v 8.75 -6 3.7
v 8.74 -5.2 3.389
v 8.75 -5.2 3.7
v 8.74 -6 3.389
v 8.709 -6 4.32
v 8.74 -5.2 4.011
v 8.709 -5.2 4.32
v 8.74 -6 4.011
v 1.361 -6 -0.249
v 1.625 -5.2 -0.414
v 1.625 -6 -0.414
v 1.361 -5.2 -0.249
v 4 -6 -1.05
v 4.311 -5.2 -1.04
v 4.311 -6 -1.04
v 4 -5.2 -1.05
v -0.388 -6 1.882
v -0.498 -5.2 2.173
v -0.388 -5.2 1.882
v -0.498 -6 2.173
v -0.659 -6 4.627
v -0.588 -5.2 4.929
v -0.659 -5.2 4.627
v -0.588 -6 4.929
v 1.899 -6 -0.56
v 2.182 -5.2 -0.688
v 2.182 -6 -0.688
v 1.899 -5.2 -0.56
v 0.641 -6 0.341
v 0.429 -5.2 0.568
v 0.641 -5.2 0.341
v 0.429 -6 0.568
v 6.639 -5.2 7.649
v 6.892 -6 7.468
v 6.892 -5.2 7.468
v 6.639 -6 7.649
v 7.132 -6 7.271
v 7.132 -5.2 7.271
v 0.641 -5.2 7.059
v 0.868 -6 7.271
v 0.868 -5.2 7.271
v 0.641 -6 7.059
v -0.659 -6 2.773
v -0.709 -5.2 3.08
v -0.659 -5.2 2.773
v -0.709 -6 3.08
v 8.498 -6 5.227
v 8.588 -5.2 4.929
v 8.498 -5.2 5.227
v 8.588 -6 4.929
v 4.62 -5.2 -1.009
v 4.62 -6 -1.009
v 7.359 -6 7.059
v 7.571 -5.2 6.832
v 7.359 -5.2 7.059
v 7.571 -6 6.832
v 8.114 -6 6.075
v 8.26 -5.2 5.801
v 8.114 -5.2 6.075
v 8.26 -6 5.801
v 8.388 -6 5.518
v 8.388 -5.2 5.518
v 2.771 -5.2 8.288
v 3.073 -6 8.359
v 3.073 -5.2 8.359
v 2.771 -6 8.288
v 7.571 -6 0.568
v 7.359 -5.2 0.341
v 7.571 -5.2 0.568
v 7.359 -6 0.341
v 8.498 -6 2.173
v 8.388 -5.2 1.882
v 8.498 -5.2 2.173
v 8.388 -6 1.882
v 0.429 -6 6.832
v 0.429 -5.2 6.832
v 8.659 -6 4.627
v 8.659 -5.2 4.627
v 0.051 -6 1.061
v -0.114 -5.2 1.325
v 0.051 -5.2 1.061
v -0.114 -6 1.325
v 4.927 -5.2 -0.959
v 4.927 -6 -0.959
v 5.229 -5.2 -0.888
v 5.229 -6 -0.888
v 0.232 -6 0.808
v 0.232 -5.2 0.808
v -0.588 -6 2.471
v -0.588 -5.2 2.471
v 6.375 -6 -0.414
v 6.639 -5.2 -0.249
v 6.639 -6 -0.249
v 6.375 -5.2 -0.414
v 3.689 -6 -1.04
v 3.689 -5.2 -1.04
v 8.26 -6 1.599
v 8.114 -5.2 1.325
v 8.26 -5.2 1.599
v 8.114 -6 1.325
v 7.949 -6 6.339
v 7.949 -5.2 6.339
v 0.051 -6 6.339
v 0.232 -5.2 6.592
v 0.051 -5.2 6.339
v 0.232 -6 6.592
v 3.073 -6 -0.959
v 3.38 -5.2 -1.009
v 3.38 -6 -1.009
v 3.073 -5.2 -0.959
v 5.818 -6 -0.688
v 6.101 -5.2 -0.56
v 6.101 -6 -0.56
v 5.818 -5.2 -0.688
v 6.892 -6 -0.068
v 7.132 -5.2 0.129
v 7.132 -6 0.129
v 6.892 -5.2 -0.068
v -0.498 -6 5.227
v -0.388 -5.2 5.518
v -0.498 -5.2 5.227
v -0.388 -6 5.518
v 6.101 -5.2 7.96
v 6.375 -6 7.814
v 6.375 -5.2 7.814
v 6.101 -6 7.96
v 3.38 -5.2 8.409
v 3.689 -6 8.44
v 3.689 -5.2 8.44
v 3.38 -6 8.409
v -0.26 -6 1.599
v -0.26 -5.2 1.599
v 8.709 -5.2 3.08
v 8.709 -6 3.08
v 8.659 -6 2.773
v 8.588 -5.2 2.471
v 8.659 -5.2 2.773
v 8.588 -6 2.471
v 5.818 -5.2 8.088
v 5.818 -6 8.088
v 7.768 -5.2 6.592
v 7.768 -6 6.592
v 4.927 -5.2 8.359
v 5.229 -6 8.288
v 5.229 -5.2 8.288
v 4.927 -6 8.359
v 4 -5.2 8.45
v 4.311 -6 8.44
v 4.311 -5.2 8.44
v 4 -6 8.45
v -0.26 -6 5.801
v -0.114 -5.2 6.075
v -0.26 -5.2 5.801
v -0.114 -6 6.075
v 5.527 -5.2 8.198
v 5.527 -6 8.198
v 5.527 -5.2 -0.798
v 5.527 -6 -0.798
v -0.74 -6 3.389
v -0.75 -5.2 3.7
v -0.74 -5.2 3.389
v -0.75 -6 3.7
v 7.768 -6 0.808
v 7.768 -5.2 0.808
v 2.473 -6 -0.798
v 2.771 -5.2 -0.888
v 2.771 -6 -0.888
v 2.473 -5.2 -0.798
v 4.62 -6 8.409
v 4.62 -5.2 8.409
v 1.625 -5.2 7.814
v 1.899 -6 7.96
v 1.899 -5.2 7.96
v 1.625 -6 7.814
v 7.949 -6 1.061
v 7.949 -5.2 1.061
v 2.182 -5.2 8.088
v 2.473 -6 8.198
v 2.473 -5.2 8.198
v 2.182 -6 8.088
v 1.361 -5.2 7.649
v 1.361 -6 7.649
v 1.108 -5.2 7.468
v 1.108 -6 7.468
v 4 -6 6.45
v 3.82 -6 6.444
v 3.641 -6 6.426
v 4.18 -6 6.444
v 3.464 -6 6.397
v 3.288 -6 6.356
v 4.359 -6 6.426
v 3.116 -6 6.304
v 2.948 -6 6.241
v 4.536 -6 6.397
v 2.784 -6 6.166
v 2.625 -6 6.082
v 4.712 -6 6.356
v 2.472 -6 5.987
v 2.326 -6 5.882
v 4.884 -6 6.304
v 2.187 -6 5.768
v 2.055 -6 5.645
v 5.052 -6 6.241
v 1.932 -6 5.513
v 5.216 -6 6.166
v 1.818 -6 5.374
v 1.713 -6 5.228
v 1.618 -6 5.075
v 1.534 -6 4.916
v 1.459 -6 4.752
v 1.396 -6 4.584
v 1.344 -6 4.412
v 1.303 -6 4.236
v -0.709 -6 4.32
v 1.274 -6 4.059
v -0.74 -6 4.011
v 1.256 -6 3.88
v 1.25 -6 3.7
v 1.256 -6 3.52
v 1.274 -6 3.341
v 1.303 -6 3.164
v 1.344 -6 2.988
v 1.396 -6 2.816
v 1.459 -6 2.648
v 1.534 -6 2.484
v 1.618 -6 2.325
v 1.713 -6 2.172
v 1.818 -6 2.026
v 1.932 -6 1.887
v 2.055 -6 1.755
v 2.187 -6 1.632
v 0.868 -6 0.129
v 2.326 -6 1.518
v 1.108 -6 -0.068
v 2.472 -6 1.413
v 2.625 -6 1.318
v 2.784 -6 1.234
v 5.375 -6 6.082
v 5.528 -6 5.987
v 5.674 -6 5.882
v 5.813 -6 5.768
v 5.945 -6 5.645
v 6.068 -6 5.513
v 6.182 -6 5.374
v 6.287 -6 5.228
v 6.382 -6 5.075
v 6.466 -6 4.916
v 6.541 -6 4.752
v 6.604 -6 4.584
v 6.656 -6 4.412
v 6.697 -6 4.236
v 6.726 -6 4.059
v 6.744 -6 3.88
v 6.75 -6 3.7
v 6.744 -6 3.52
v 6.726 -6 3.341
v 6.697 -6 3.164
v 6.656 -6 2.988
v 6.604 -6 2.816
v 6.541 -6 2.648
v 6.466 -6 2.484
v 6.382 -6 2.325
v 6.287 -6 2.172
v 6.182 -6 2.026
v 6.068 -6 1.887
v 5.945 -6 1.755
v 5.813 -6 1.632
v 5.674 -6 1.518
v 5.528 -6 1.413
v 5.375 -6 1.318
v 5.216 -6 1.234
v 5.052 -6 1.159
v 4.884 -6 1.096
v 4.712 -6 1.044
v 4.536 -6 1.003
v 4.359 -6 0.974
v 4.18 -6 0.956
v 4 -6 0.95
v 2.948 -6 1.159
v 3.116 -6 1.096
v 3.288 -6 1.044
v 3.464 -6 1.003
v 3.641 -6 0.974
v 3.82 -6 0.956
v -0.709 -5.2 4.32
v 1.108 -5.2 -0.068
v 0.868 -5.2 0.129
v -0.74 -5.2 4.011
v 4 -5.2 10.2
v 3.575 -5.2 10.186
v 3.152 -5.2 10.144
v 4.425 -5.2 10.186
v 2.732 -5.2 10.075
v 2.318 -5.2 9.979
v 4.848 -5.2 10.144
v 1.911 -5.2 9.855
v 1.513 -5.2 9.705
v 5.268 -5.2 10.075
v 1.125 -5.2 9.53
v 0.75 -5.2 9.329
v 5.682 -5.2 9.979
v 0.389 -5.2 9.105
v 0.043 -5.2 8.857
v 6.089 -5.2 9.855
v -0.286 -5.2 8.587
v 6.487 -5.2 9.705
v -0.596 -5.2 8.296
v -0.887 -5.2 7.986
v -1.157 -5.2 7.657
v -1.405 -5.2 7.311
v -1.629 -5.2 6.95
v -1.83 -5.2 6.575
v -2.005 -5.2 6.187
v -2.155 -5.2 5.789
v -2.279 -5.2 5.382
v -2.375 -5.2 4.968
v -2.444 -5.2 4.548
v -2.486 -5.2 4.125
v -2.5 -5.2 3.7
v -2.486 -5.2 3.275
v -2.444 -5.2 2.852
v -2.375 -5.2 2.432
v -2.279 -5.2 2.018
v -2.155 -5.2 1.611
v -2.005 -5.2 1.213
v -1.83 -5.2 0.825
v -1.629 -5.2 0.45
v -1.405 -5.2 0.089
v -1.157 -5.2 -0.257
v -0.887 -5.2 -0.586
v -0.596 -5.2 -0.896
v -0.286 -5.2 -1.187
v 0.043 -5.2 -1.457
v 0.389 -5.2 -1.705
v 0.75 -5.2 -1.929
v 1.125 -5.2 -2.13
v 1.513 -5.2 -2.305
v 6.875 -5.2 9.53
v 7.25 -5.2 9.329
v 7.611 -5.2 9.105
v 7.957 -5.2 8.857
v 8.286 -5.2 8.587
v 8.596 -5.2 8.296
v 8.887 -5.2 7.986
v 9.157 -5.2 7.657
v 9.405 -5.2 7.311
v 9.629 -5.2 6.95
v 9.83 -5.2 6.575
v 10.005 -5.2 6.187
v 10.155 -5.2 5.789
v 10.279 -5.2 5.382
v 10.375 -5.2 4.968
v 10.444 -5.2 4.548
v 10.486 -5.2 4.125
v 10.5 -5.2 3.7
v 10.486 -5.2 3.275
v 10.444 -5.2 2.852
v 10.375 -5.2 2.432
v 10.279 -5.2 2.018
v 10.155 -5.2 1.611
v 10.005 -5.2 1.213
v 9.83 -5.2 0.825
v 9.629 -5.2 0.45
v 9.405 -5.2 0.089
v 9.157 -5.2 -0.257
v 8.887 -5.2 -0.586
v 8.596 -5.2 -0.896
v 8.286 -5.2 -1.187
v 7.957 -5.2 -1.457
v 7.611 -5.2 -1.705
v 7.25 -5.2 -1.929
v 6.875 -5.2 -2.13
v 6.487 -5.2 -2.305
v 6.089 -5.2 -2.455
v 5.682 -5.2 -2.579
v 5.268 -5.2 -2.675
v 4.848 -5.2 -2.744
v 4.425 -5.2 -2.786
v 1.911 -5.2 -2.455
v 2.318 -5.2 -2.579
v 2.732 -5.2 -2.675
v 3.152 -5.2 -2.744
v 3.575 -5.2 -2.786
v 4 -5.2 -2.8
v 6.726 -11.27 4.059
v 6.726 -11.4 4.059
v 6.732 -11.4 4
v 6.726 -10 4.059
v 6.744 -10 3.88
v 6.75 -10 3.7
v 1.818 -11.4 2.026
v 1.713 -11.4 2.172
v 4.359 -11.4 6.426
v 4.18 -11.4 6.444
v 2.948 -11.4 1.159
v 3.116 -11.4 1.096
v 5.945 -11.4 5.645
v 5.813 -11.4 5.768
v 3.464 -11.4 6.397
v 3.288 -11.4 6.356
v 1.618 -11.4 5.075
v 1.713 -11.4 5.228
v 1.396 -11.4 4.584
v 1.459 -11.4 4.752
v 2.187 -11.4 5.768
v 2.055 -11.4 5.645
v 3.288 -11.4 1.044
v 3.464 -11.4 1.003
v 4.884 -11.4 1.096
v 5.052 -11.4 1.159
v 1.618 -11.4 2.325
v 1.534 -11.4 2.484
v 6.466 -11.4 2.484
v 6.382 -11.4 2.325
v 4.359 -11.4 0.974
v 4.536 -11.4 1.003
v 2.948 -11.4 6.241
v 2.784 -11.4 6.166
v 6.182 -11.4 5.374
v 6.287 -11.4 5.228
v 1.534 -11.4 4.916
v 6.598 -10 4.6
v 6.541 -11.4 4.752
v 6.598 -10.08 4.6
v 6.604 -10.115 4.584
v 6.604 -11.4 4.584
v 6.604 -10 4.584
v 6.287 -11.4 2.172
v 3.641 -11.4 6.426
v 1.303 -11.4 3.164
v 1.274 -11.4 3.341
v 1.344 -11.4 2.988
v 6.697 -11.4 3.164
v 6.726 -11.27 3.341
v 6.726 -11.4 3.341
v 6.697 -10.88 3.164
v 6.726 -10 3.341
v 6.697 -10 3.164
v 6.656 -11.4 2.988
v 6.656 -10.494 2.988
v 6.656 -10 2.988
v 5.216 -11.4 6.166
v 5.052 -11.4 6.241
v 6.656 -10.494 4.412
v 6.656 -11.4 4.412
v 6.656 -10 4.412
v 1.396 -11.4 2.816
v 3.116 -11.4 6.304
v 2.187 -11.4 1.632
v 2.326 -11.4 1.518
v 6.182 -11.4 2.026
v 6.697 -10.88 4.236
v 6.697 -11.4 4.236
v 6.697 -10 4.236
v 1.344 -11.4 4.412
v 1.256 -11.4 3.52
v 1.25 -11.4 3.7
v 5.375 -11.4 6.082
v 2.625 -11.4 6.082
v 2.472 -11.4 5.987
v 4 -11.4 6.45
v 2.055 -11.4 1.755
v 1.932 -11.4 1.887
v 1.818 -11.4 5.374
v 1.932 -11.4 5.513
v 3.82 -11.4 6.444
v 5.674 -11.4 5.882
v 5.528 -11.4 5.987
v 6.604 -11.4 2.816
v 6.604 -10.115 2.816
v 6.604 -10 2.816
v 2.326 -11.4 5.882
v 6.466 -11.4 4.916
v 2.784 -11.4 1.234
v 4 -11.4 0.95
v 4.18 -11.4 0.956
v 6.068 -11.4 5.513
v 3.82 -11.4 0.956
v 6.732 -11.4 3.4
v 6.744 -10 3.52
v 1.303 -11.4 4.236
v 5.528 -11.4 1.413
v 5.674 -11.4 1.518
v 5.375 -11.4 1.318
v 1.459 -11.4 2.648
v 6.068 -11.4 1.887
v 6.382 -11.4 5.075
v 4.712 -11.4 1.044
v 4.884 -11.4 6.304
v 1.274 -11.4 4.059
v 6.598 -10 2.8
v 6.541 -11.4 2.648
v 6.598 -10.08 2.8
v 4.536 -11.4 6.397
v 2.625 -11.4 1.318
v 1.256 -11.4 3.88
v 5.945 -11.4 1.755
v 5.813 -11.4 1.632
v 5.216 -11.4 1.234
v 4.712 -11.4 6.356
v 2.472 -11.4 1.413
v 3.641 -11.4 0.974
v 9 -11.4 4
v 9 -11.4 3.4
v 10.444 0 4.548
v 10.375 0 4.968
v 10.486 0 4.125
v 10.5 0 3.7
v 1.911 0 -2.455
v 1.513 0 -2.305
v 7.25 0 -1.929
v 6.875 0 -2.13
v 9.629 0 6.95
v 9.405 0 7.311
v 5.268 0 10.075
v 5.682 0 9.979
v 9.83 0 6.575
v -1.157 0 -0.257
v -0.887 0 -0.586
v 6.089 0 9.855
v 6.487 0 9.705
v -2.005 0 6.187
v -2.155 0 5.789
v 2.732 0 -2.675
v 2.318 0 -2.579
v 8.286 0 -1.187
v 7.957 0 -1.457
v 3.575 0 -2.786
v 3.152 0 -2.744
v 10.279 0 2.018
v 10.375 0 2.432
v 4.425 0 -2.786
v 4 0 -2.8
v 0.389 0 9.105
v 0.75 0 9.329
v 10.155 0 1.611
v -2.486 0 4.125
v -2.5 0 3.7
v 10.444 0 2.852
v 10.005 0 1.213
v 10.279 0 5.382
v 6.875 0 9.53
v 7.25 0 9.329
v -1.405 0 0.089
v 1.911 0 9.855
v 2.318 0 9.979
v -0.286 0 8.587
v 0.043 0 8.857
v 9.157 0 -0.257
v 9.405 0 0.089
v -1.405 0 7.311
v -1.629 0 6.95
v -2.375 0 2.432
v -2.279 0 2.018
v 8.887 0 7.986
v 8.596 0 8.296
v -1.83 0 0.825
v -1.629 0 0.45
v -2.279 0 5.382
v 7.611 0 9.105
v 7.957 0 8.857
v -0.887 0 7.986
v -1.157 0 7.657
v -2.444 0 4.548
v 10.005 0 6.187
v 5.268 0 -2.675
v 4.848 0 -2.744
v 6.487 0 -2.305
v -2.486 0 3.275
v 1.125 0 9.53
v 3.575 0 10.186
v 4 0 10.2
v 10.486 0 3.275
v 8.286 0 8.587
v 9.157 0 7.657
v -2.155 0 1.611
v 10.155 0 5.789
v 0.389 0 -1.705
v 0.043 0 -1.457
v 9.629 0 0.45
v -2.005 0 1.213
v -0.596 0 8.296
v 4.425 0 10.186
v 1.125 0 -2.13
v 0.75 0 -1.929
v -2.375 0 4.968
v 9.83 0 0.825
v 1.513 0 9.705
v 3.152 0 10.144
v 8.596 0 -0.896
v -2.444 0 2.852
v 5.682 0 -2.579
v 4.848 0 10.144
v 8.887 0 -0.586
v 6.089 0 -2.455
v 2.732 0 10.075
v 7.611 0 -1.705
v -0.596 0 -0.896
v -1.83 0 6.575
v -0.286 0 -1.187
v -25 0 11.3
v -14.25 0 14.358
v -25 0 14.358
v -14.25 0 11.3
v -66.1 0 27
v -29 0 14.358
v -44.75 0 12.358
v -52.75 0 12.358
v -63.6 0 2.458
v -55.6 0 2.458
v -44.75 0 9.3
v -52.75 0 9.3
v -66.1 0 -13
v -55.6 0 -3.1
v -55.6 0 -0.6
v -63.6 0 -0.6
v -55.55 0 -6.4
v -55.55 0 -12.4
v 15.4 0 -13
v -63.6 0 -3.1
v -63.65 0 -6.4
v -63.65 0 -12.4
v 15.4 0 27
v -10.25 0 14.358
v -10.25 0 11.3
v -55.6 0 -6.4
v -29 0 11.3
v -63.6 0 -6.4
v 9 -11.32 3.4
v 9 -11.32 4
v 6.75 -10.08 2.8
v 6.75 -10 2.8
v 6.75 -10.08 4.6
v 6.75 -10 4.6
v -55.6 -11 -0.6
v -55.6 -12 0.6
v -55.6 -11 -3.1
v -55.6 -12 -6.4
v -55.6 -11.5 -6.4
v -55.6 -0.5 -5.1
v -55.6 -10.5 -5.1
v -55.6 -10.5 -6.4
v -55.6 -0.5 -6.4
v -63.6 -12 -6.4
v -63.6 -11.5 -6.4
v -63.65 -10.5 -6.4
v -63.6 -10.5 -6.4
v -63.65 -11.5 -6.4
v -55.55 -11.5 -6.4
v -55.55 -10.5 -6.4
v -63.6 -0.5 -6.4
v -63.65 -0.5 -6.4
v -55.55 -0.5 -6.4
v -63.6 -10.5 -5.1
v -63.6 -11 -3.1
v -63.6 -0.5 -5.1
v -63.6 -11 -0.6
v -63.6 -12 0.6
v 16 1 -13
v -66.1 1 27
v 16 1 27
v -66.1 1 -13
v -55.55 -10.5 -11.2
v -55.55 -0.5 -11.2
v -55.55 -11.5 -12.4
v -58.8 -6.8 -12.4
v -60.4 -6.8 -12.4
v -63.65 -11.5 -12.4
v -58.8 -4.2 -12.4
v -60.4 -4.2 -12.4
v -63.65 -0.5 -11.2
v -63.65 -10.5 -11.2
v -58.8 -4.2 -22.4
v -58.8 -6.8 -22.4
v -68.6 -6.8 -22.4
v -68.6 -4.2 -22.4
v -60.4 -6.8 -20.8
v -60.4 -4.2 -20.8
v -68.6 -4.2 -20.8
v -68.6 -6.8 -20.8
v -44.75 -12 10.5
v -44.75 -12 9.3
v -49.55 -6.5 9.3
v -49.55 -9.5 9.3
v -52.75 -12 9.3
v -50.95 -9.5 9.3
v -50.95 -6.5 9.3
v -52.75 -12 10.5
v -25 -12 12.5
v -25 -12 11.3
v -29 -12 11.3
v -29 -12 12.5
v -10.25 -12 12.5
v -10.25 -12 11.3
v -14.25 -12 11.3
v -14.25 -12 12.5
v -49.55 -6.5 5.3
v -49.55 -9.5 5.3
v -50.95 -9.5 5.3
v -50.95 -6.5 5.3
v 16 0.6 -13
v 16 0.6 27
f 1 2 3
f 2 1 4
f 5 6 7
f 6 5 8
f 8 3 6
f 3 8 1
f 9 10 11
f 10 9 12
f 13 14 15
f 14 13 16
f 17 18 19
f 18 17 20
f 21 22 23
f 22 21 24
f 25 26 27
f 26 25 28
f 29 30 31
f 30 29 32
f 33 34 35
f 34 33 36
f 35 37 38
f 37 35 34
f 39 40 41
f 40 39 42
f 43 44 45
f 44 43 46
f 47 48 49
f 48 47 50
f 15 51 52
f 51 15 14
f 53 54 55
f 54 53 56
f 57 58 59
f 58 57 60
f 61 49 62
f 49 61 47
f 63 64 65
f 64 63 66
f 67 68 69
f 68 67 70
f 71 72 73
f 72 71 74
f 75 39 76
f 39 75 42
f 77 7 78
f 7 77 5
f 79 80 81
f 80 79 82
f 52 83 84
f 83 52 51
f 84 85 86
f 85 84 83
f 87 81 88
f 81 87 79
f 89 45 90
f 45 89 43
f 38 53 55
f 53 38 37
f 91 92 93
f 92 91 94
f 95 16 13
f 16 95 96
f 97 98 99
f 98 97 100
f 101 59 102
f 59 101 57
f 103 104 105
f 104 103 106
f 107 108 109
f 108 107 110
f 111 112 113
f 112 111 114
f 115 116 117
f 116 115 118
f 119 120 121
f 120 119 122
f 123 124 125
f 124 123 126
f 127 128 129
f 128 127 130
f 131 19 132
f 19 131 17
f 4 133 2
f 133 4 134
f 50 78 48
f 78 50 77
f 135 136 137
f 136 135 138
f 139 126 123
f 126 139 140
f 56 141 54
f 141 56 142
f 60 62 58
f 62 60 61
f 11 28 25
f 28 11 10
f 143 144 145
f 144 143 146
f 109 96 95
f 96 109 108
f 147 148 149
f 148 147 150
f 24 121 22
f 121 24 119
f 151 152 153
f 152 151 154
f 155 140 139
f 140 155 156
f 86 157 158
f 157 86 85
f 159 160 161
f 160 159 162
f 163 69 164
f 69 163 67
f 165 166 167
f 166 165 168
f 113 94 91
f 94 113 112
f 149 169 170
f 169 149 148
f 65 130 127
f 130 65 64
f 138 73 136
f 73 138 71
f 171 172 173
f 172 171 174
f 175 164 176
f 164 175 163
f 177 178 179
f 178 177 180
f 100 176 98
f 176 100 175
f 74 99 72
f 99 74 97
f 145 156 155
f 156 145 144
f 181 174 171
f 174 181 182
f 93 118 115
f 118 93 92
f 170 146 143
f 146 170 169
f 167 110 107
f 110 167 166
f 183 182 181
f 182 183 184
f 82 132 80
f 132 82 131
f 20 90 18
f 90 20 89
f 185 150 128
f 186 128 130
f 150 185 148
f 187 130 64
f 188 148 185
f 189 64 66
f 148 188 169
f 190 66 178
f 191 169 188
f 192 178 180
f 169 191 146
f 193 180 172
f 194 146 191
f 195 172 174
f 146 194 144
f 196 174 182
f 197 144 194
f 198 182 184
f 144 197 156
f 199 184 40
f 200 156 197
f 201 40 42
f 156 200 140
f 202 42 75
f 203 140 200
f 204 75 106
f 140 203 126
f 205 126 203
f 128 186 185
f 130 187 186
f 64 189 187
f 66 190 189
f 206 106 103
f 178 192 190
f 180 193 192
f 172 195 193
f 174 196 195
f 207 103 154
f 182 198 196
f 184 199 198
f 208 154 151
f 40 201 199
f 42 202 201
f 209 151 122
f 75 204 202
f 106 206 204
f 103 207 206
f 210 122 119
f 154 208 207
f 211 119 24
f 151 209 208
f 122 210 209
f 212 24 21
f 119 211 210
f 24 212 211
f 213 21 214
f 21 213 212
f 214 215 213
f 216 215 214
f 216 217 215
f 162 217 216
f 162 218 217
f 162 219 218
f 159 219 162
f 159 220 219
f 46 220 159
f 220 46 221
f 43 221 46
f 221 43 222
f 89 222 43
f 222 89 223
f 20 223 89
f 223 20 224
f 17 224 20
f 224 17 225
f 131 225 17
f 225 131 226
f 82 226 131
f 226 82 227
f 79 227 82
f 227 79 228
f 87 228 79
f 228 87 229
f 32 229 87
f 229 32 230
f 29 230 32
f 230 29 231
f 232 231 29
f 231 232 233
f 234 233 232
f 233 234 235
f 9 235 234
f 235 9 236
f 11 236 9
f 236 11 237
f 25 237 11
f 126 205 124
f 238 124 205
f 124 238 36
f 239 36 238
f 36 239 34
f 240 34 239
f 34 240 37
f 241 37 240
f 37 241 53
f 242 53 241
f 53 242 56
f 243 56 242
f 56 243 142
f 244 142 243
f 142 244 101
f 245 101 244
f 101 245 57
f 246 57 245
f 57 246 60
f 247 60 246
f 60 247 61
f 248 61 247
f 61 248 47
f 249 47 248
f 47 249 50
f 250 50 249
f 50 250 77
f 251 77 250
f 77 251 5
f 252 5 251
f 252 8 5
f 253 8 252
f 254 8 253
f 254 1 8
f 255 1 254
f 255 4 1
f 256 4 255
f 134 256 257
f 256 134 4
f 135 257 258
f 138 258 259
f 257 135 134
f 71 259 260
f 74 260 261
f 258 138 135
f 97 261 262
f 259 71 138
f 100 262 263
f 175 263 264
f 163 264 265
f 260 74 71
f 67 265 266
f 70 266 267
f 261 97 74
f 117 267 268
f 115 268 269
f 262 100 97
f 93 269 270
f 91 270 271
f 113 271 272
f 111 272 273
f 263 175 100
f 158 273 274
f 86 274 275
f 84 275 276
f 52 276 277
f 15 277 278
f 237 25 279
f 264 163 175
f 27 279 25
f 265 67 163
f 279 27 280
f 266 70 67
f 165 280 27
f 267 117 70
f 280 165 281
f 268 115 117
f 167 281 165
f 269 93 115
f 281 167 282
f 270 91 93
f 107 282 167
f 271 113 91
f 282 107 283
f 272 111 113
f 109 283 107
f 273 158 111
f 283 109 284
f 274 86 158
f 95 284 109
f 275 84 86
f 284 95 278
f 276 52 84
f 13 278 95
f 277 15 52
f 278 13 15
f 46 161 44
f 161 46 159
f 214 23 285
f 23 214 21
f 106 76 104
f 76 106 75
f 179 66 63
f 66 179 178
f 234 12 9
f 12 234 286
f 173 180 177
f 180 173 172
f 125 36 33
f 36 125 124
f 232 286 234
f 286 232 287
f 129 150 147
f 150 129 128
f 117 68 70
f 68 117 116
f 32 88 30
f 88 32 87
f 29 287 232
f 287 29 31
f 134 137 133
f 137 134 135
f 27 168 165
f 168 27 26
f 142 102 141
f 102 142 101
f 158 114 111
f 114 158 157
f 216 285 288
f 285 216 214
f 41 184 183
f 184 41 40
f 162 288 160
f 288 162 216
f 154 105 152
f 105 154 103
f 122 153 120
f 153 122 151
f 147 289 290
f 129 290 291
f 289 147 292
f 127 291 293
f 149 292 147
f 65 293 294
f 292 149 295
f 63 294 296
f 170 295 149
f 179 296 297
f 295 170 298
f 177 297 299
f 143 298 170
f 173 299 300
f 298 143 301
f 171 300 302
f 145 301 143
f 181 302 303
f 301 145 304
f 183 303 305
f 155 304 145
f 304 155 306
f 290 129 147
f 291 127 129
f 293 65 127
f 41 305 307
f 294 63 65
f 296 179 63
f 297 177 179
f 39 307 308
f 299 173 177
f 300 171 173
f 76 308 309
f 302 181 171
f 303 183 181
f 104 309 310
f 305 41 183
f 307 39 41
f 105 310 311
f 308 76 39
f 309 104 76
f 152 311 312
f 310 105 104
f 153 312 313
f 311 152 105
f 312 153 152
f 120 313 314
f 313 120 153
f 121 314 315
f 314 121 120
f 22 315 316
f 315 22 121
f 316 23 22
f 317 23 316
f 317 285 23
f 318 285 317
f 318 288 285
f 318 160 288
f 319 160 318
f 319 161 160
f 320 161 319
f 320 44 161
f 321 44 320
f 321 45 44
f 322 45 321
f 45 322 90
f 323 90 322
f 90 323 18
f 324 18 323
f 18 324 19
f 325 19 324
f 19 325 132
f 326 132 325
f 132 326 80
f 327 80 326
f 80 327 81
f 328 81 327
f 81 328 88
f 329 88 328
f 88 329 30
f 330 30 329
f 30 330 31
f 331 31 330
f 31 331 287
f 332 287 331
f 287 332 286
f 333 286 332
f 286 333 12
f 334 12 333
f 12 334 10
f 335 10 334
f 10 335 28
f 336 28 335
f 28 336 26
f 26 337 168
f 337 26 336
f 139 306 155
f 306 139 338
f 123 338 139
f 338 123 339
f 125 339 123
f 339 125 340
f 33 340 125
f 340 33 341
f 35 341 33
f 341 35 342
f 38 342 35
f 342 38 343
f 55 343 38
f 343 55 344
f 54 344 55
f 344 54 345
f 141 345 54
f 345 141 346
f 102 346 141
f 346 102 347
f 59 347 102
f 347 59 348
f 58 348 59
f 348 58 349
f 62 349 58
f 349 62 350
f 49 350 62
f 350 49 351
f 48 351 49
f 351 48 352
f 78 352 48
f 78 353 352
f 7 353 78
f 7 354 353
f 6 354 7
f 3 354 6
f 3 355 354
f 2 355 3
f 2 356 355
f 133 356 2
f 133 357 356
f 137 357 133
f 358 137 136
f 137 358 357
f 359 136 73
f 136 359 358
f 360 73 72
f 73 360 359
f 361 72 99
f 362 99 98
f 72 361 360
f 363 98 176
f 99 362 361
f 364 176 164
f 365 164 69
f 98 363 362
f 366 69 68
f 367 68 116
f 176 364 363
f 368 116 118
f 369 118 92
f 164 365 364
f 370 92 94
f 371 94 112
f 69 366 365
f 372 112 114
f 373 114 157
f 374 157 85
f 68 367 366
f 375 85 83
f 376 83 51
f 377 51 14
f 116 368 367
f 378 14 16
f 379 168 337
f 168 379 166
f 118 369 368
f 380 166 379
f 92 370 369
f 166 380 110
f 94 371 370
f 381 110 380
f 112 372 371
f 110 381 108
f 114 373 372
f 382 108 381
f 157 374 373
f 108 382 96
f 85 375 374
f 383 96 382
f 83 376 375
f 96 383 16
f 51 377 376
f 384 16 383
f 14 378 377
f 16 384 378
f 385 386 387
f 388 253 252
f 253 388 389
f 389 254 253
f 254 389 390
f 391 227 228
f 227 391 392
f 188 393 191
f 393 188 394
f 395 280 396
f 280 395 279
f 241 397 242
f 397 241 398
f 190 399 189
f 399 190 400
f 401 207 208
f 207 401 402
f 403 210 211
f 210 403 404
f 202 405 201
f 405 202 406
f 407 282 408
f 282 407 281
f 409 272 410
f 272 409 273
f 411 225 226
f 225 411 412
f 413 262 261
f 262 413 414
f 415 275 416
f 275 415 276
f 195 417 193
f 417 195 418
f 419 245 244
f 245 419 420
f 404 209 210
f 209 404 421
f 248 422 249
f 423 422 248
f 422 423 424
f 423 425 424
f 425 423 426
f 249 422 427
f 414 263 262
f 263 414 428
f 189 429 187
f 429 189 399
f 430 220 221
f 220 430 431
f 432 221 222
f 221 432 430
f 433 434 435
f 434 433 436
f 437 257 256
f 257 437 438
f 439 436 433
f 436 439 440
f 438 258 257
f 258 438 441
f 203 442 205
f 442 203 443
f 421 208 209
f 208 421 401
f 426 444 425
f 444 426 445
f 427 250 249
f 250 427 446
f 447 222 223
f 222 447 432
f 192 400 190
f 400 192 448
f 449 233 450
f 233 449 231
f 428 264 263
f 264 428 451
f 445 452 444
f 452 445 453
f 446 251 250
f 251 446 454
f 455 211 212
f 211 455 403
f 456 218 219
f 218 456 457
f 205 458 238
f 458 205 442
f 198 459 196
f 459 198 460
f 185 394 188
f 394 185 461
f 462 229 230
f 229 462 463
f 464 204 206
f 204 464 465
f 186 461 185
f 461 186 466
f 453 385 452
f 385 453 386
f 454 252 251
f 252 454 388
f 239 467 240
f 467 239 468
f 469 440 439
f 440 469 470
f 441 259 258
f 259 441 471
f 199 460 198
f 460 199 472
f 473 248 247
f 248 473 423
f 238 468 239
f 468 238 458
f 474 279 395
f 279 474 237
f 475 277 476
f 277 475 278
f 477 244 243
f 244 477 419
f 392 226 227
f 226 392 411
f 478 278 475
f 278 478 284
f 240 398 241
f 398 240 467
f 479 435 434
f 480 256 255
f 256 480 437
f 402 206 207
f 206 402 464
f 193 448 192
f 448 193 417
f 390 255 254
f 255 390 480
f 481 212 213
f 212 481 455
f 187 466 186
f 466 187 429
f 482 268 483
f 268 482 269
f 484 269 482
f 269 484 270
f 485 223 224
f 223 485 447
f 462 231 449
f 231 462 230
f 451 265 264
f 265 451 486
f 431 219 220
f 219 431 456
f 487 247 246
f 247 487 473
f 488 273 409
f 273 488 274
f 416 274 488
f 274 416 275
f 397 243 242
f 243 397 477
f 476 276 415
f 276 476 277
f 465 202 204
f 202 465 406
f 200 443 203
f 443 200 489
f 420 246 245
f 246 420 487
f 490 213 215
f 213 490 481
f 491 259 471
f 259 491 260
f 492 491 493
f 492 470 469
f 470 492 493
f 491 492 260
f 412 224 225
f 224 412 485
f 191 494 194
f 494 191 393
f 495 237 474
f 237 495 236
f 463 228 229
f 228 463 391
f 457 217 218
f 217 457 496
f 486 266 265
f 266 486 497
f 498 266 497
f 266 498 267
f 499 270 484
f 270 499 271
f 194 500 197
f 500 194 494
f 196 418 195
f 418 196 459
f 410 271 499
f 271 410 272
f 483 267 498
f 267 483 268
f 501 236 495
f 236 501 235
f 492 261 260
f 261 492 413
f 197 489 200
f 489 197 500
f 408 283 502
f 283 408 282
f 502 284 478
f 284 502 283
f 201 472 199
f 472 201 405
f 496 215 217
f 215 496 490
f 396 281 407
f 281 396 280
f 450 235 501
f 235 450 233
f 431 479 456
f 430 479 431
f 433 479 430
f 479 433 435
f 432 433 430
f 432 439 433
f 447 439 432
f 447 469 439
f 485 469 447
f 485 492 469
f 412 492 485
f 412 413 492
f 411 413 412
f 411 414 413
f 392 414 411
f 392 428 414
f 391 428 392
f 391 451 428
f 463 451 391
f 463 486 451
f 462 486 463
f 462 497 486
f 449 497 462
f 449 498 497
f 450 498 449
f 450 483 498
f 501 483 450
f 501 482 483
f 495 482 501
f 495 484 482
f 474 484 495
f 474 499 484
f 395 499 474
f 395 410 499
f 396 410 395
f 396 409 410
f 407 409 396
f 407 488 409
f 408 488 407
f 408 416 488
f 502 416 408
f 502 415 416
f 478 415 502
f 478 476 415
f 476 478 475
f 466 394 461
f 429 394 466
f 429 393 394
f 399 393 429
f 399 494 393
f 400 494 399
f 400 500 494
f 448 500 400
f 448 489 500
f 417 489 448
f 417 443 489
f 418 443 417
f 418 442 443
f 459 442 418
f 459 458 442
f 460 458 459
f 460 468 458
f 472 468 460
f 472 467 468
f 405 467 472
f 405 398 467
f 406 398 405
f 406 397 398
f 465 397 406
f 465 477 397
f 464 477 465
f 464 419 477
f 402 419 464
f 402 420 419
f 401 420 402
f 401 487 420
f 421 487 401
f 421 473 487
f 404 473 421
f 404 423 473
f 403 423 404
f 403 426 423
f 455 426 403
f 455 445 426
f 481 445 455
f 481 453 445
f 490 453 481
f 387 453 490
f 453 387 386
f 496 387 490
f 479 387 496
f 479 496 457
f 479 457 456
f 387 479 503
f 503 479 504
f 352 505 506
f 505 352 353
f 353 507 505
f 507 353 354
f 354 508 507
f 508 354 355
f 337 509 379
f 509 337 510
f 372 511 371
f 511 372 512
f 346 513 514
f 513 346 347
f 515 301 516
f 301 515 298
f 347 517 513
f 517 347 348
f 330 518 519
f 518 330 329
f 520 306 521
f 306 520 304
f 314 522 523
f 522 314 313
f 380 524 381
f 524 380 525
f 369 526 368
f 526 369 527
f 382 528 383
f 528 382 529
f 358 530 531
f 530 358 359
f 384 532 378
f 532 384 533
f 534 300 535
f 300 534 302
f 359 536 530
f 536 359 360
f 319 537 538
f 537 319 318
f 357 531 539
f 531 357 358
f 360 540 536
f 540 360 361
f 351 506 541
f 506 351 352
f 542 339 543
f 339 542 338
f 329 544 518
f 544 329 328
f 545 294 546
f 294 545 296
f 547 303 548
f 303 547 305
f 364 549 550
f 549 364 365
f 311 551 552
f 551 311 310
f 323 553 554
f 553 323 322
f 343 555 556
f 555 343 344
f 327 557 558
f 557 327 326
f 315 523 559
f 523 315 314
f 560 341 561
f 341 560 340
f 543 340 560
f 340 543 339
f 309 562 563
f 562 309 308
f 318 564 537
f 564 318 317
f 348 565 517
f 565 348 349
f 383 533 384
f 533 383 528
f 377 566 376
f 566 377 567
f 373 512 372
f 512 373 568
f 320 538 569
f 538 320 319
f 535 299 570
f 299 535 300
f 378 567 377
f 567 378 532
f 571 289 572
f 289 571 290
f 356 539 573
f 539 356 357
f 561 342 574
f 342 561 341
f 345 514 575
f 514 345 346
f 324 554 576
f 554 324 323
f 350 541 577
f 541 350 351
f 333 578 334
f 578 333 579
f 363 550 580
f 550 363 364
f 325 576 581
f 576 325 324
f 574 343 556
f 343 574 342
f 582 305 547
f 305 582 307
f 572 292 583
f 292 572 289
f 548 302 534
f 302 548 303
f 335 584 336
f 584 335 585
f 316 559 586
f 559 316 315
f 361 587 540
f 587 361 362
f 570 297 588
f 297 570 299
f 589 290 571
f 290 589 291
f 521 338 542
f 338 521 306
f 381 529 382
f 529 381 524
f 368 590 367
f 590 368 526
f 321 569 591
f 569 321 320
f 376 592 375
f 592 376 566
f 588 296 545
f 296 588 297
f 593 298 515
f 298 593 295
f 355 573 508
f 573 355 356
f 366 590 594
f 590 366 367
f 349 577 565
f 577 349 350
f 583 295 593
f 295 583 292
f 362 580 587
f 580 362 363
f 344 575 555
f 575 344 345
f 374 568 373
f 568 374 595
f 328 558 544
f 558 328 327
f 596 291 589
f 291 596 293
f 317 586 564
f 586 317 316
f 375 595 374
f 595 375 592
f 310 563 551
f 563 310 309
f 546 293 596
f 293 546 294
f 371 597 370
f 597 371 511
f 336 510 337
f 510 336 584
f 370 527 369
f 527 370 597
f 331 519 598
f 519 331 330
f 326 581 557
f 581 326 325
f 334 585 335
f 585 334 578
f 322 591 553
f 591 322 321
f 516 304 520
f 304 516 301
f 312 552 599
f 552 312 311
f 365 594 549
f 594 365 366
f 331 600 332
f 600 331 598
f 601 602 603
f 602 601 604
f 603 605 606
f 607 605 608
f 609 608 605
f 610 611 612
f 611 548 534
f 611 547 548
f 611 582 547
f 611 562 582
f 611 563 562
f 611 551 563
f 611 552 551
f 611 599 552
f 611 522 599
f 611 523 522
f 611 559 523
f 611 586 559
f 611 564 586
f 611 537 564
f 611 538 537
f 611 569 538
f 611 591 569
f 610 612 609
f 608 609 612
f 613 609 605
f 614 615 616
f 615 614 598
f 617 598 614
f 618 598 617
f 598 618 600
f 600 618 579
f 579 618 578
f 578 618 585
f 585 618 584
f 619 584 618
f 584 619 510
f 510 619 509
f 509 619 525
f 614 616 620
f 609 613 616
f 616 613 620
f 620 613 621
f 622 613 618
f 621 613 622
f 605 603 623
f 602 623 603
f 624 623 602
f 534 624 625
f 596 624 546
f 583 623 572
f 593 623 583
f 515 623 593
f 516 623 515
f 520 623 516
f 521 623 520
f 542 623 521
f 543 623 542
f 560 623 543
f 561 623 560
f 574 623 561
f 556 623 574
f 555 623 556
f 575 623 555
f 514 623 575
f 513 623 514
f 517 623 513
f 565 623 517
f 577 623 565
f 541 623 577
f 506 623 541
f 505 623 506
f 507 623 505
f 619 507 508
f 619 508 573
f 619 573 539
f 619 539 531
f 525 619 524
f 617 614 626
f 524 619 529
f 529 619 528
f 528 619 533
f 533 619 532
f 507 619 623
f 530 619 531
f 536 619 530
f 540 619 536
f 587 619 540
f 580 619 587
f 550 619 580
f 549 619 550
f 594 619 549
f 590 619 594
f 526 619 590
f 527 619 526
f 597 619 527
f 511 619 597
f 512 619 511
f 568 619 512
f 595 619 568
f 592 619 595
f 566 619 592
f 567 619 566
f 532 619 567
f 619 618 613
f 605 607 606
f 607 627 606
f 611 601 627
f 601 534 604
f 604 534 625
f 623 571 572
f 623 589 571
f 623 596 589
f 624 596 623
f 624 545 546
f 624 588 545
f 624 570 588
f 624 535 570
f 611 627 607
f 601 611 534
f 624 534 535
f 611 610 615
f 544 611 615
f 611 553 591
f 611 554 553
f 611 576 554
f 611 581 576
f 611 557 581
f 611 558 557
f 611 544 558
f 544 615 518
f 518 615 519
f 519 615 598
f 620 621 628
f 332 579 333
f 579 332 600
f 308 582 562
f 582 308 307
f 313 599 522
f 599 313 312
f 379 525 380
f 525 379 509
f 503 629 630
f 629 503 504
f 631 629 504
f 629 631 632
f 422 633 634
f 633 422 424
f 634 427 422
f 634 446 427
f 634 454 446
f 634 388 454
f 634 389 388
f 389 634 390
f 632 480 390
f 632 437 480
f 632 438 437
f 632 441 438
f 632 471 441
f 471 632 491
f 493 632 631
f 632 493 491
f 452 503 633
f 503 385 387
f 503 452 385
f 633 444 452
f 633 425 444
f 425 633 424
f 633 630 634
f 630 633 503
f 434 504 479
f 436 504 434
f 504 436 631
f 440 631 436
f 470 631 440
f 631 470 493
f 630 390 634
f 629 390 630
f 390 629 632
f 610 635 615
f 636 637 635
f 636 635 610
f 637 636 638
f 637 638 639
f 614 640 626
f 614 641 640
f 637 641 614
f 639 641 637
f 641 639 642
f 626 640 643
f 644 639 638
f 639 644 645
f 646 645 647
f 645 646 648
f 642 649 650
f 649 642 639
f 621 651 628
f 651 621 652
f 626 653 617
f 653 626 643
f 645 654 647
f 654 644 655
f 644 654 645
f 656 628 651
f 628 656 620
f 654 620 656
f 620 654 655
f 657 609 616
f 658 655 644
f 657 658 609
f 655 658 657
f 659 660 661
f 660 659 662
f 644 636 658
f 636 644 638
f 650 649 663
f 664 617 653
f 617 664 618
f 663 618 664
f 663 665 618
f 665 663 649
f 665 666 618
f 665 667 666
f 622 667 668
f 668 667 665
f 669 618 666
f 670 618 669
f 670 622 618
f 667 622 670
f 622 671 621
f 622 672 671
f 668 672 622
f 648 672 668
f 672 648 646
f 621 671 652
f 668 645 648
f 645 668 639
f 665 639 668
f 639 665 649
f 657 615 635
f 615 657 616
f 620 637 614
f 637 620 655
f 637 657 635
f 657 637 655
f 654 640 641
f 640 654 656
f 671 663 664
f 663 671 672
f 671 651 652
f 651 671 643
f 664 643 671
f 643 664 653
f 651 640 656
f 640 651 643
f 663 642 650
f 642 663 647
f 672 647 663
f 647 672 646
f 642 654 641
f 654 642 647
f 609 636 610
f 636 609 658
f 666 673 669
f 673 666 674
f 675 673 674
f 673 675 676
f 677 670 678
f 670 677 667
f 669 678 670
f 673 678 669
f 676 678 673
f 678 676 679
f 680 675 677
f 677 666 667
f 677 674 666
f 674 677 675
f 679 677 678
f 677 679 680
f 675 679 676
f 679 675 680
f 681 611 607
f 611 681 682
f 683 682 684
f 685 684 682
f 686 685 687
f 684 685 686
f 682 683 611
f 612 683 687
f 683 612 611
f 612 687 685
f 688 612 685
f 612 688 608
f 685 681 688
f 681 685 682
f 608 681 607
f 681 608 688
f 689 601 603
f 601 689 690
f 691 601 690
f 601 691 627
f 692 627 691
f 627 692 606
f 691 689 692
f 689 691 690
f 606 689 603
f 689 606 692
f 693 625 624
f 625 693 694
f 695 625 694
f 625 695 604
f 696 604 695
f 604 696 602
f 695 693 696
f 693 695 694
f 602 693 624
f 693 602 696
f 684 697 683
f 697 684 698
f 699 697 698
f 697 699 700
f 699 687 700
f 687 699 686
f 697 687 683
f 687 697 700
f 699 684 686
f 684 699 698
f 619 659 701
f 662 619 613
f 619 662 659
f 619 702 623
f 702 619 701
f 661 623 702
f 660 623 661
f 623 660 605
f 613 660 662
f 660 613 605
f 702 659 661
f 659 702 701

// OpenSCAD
// DOUBLE TAKE FRAMES — CANONICAL CLIPLESS KEYED WALL RIG
// DTF_RELEASE: 3.0.0
// Released: 2026-09-24
// Versioning: Semantic Versioning 2.0.0 (https://semver.org/)
// Status: CANONICAL
// Changes in 3.0.0:
// Adds a print-friendly bayonet stop lug to the pivot peg so the keyed latch
// needs no C-clip. On this mirrored wall rig, the lug faces
// outward toward +X (right in the backside/SCAD view), preventing the released, downward-
// hanging latch keyway from aligning with it and slipping off.
// Changes in 2.0.4:
// - Carried forward unchanged for the coordinated capstan and clock-string-guide release.
// Changes in 2.0.3:
// - Carried forward unchanged for the corrected prepared-project packaging.
// Changes in 2.0.2:
// - Carried forward unchanged for the native 3MF packaging hotfix.
// Changes in 2.0.1:
// - Carried forward unchanged for the prepared-project packaging correction.
// Changes in 2.0.0:
// - Carried forward without geometry changes for the coordinated 2.0.0 release.
// Full release notes: https://doubletakeframes.com/build/#design-release
//
// Public wall-rig source. This file contains only the fixed rig; the
// standalone latch source is the sole authority for the moving part.
$fn = 96;

inch = 25.4;
eps  = 0.05;

// =========================================================
// CONVENTIONAL FRAME
// x: right is +
// y: away from viewer is +
// z: up is +
// wall plane is y = 0
//
// mounted hardware projecting toward viewer lives in NEGATIVE y
// =========================================================

// =========================================================
// GLOBAL / WALL
// =========================================================
show_wall = true;
wall_t    = 1.0;

// wall will auto-expand to fit both latch base and tunnel
wall_margin = 5;
// 
// LATCH BASE PARAMS
// =========================================================
pad_w = 16;   // X
pad_h = 16;   // Z
pivot_boss_d = 13.0;

standoff_d = 9.5;
standoff_h = 0.8;   // along Y
post_d     = 5.5;
post_h     = 4.0;   // along Y
// The bayonet needs no reduced C-clip groove. Continue the full post diameter
// through the upper lug-ramp section for strength and layer support.
neck_d     = post_d;
neck_h     = 1.4;   // bayonet lug ramp length along Y

// One minimal bayonet nub. Its outer radius is reached gradually across the
// 1.4 mm upper ramp length, avoiding an unsupported shelf when the wall panel
// prints flat. The mating latch has one loose arm-side bore recess.
bayonet_lug_outer_r = 5.00;
bayonet_lug_tangent_w = 1.80;
bayonet_lug_root_overlap = 0.60;
bayonet_lug_slice_y = 0.08;
// The unrotated hull grows toward +X: outward/right in the mirrored wall rig's
// backside/SCAD view.
bayonet_lug_angle = 0;
// A symmetric one-nozzle-wide outer tip is simpler and more reliable than a
// barely visible one-sided taper. The structural root remains 1.80 mm wide.
bayonet_lug_tip_w = 0.60;

// The corral is the Y source of truth. Center the eye plane on its complete
// outer depth, then derive the wall-rooted pad extension needed to put the
// shoulder/post stack there.
corral_clear_d_y = 13.0;
corral_wall_t = 1.2;
corral_global_outer_y1 = -0.30;
corral_center_y_target = corral_global_outer_y1
                         - (corral_clear_d_y + 2*corral_wall_t)/2;
pad_t = -corral_center_y_target - standoff_h - post_h/2;

// These are retained only because tunnel placement is still
// logically referenced from where the latch bar tip used to be.
eye_outer_d = 14.0;
arm_len     = 1.5 * inch;
tip_len     = 2.0;

// =========================================================
// LATCH BASE Y STACK
// =========================================================
pad_y_wall = 0;
pad_y_out  = -pad_t;

standoff_y0 = pad_y_out;
standoff_y1 = standoff_y0 - standoff_h;

post_y0 = standoff_y1;
post_y1 = post_y0 - post_h;

neck_y0 = post_y1;
neck_y1 = neck_y0 - neck_h;

// =========================================================
// LATCH REFERENCE X/Z GEOMETRY
// =========================================================
bar_x_inner = -(eye_outer_d/2 - 0.5);
bar_x_outer = bar_x_inner - arm_len;

// Legacy fixed-rig datum only. The old solid extension at this location was
// an abandoned bevel experiment and is intentionally not part of the latch.
tip_x0 = bar_x_outer - tip_len;
tip_x1 = bar_x_outer;

// =========================================================
// STANDALONE LATCH INTERFACE DATUMS
// =========================================================
latch_t = 3.4;

// Solid far-end extension outside the centered 41.5 mm weight pocket. Five
// millimeters leaves useful material on every side of the enclosed key socket.
corral_end_wall_t_x = 5.0;

// Keep the weight pocket on the canonical paper/cassette centerline. The new
// 5 mm keyed extension grows only toward the zipper, so move the zipper package
// left by the same 5 mm to preserve the original tunnel-to-corral gap.
latch_package_shift_x = 0;
zipper_package_shift_x = -corral_end_wall_t_x;
pivot_x = 4.0 + latch_package_shift_x;

// Keep the latch eye centered within the 4 mm post length. Because pad_t is
// derived above, the eye plane also lands on the corral's Y centerline.
latch_install_y = post_y1 + (post_h-latch_t)/2;

corral_clear_w_x = 41.5;
corral_depth_z = 8.0;
corral_floor_t = 1.2;
canonical_weight_center_x = -27.0;

// Size changes are split evenly across the pocket so the weight, cassette,
// and paper retain their shared canonical X centerline.
corral_inner_x0 = canonical_weight_center_x - corral_clear_w_x/2;
corral_inner_x1 = canonical_weight_center_x + corral_clear_w_x/2;
// Add a solid keyed extension beyond the 41.5 mm weight pocket.
corral_floor_x0 = corral_inner_x0 - corral_end_wall_t_x;
corral_floor_x1 = corral_inner_x1 + corral_wall_t;

// Keep the floor close to the frame wall while clearing it through the swing.
// The frame wall itself is the +Y side and broad anti-racking stop.
corral_outer_y1 = corral_global_outer_y1 - latch_install_y;
corral_inner_y1 = corral_outer_y1 - corral_wall_t;
corral_inner_y0 = corral_inner_y1 - corral_clear_d_y;
corral_outer_y0 = corral_inner_y0 - corral_wall_t;

corral_global_outer_y0 = latch_install_y + corral_outer_y0;
corral_global_inner_y0 = latch_install_y + corral_inner_y0;
corral_global_inner_y1 = latch_install_y + corral_inner_y1;

// =========================================================
// TUNNEL PARAMS
// =========================================================
tunnel_w_x = 8.0;
tunnel_d_y = 13.0;
tunnel_h_z = 14.0;       // retained only to preserve the canonical -7 mm floor
tunnel_roof_t_z = 1.2;   // printable roof above the unchanged zipper slot

slot_margin_y = 1;
slot_h_z      = 2.5;
slot_offset_z = -2.45; // local slot datum; package-level Z shift is applied below

// underside cubby
cubby_wall_y  = 1.0;
cubby_drop_z  = 6;
cubby_depth_z = 6.1;  // gains the 1.1 mm removed from the zipper-head slot
cubby_extra_y = -1.0;
cubby_floor_z = 1.2;

// placement controls
tunnel_gap_from_tip = 4.0;
tunnel_mount_dx     = zipper_package_shift_x;
tunnel_mount_dz     = 0.6;

tunnel_y_back  = 1;
tunnel_y_front = tunnel_y_back - tunnel_d_y;

// =========================================================
// CROOK PARAMS
// =========================================================
crook_w_x      = 1.6;
crook_t_y      = 2.6;
crook_drop_z   = 10.0;
crook_left_dx  = 9.0;
crook_rise_z   = 6.0;
crook_mount_dx = 0.0;
crook_mount_dy = 0.0;

// =========================================================
// DERIVED TUNNEL PLACEMENT
// =========================================================
tunnel_x1 = tip_x0 - tunnel_gap_from_tip + tunnel_mount_dx;
tunnel_x0 = tunnel_x1 - tunnel_w_x;

tunnel_corral_gap_x = corral_floor_x0 - tunnel_x1;
assert(tunnel_corral_gap_x >= 2.0,
       str("Tunnel-to-corral X gap too small: ",
           tunnel_corral_gap_x, " mm"));

tunnel_z0 = -tunnel_h_z/2 + tunnel_mount_dz;

slot_x0 = tunnel_x0 - eps;
slot_x1 = tunnel_x1 + eps;

slot_y0 = tunnel_y_front + slot_margin_y;
slot_y1 = tunnel_y_back  - slot_margin_y;

// Decouple the zipper datum from the now-trimmed tunnel roof. This preserves
// the canonical slot at -3.7..-1.2 mm while allowing dead mass above it to go.
slot_zc = tunnel_mount_dz + slot_offset_z;
slot_z0 = slot_zc - slot_h_z/2;
slot_z1 = slot_zc + slot_h_z/2;
tunnel_z1 = slot_z1 + tunnel_roof_t_z;

// =========================================================
// PRIMARY LATCH Z DATUM
// =========================================================
// Preserve the established corral and pivot Z datums while raising only the
// zipper package. The physical prototype retains more gap than the nominal CAD
// stack predicts, so the +0.6 mm shift intentionally closes more of the
// observed as-printed clearance without moving the corral or pivot.
corral_floor_z0 = -0.90;
zipper_corral_nominal_gap_z = corral_floor_z0 - slot_z1;
corral_floor_z  = corral_floor_z0 + corral_floor_t;
corral_wall_z1 = corral_floor_z + corral_depth_z;
pivot_z = (corral_floor_z0 + corral_wall_z1) / 2;

//=========================================================
// SINGLE FN WHEEL-WEIGHT GARAGE
// =========================================================
garage_slide_clear_x = 0.30;
garage_slide_clear_y = 0.30;
garage_roof_overlap_x = 3.0;
garage_roof_underside_z = corral_floor_z + 9.0;
garage_roof_t_z = 1.2;
garage_roof_cup_run_y = 4.0;
garage_roof_cup_drop_z = 0.60;
garage_middle_roof_w_x = 4.0;
garage_right_roof_w_x = garage_middle_roof_w_x;
garage_right_roof_center_x = corral_inner_x1 - 6.0;
garage_middle_right_raise_z = 2.0;

// Paper-safe reinforcement for wall-rooted horizontal features. The added
// material is tallest at the wall and tapers to zero at the free edge, so a
// descending sheet encounters a glide ramp rather than a square shoulder.
paper_ramp_root_h_z = 2.0;
paper_ramp_slice_y = 0.08;

// The pivot radius locates the corral in X, so no fixed -X stop is required.
// The left roof remains wall-rooted and carries the loose Y-retention tooth.
garage_left_roof_x0 = corral_floor_x0;
weight_clear_x0 = corral_floor_x0 - garage_slide_clear_x;

blinder_y0 = corral_global_outer_y0 - garage_slide_clear_y;
blinder_y1 = tunnel_y_back;
garage_roof_cup_y1 = blinder_y0 + garage_roof_cup_run_y;
blinder_z0 = tunnel_z1;
blinder_z1 = garage_roof_underside_z + garage_roof_t_z;
blinder_h_z = blinder_z1 - blinder_z0;

// Far-end Y key. A roof-hung vertical tooth drops into a socket that is fully
// enclosed in X and Y and open only at the top. The latch swings downward to
// disengage it; the pivot remains the sole right-end restraint.
latch_key_tooth_w_x = 1.4;
latch_key_tooth_w_y = 3.0;
latch_key_clear_xy = 0.60;
latch_key_clear_z = 0.60;
latch_key_engagement_z = 3.0;
latch_key_roof_overlap_z = 0.30;

latch_key_xc = (corral_floor_x0 + corral_inner_x0) / 2;
latch_key_local_yc = (corral_outer_y0 + corral_outer_y1) / 2;
latch_key_global_yc = latch_install_y + latch_key_local_yc;

latch_key_tooth_x0 = latch_key_xc - latch_key_tooth_w_x/2;
latch_key_tooth_x1 = latch_key_xc + latch_key_tooth_w_x/2;
latch_key_notch_x0 = latch_key_tooth_x0 - latch_key_clear_xy;
latch_key_notch_x1 = latch_key_tooth_x1 + latch_key_clear_xy;

latch_key_tooth_y0 = latch_key_global_yc - latch_key_tooth_w_y/2;
latch_key_tooth_y1 = latch_key_global_yc + latch_key_tooth_w_y/2;
latch_key_notch_y0 = latch_key_local_yc
                     - latch_key_tooth_w_y/2 - latch_key_clear_xy;
latch_key_notch_y1 = latch_key_local_yc
                     + latch_key_tooth_w_y/2 + latch_key_clear_xy;

latch_key_tooth_z0 = corral_wall_z1 - latch_key_engagement_z;
latch_key_tooth_z1 = garage_roof_underside_z
                     + latch_key_roof_overlap_z;
latch_key_notch_z0 = latch_key_tooth_z0 - latch_key_clear_z;

// Preserve the roof overlap over the actual weight pocket while leaving the
// far end open in X; the pivot radius now supplies all X location.
garage_left_roof_x1 = corral_inner_x0 + garage_roof_overlap_x;

// Carry the full guard clearance through the supporting geometry below.
// The pivot pedestal is circular; rectangular corners add no useful support
// and intrude into the corral's swept envelope.
latch_pad_x0 = pivot_x - pivot_boss_d/2;
latch_pad_x1 = pivot_x + pivot_boss_d/2;
// =========================================================

// =========================================================
// VISOR
// =========================================================
visor_t_z        = 1.0;
visor_overlap_x  = 1.0;
visor_extra_y    = .5;

visor_x0    = tunnel_x1 - visor_overlap_x;
visor_x1    = weight_clear_x0;

visor_y0    = tunnel_y_front - visor_extra_y;
visor_y1    = tunnel_y_back;

visor_z0    = tunnel_z1 - visor_t_z;
visor_z1    = tunnel_z1;

// =========================================================
// VISOR DROP
// =========================================================
visor_drop_y_t = 1.0;
visor_drop_z   = 14.0;

visor_drop_x0 = visor_x0;
visor_drop_x1 = visor_x1;

visor_drop_y0 = visor_y0;
visor_drop_y1 = visor_y0 + visor_drop_y_t;

visor_drop_z0 = visor_z0 - visor_drop_z;
visor_drop_z1 = visor_z0;

// =========================================================
// INNER STOP
// =========================================================
inner_stop_x_w       = 2.0;
inner_stop_gap_z     = 0.8;
inner_stop_depth_y   = 3.0;

inner_stop_x0 = visor_x1 - inner_stop_x_w;
inner_stop_x1 = visor_x1;

inner_stop_y0 = -inner_stop_depth_y;
inner_stop_y1 = wall_t;

inner_stop_z0 = slot_z1 + inner_stop_gap_z;
inner_stop_z1 = visor_z0;

// =========================================================
// AUTO WALL FOOTPRINT
// =========================================================
hardware_x0 = min(latch_pad_x0, tunnel_x0);
hardware_x1 = max(latch_pad_x1, visor_x1);

// Preserve the hardware-derived values for clearance checks, but do not let
// them resize the backing plane. The current structures are X-indifferent and
// remain at their present coordinates inside the canonical wall rectangle.
hardware_z0 = min(-pad_h/2, min(tunnel_z0 - cubby_drop_z, visor_drop_z0));
hardware_z1 = max( pad_h/2, tunnel_z1);

weight_pocket_center_x = (corral_inner_x0 + corral_inner_x1) / 2;
assert(abs(weight_pocket_center_x - canonical_weight_center_x) < eps,
       str("Weight pocket left canonical X centerline: ",
           weight_pocket_center_x, " mm"));

// Preserve the canonical wall plane's absolute bounds as well as its size.
// Its historical rectangle is slightly asymmetric around the weight path.
canonical_wall_x0 = -66.1;
canonical_wall_x1 =  16.0;
canonical_wall_z0 = -13.0;
canonical_wall_z1 =  27.0;

wall_w = canonical_wall_x1 - canonical_wall_x0;
wall_h = canonical_wall_z1 - canonical_wall_z0;

// The rig slides toward +X into the cassette's left-side capture lips. The
// bevel is an X/Y cross-section extruded along the complete right edge in Z:
// its top face stops short and slopes down toward the +X tip, while the bottom
// face remains flat and full-length as the sliding datum.
rig_right_edge_lead_in = 0.60;
rig_right_edge_nose_t = wall_t - rig_right_edge_lead_in;

// =========================================================
// HELPERS
// =========================================================
module rect_prism(x0, x1, y0, y1, z0, z1) {
    translate([min(x0,x1), min(y0,y1), min(z0,z1)])
        cube([abs(x1-x0), abs(y1-y0), abs(z1-z0)]);
}

module cyl_y_span(d, y0, y1) {
    translate([0, max(y0,y1), 0])
        rotate([90,0,0])
            cylinder(d=d, h=abs(y1-y0), center=false);
}

module tunnel_crook() {
    crook_top_z = tunnel_z0 - cubby_drop_z;

    crook_xc = (slot_x0 + slot_x1) / 2 + crook_mount_dx;
    crook_yc = ((slot_y0 - cubby_extra_y/2) + (slot_y1 + cubby_extra_y/2)) / 2 + crook_mount_dy;

    crook_vert_x0 = crook_xc - crook_w_x/2;
    crook_vert_x1 = crook_xc + crook_w_x/2;
    crook_vert_y0 = crook_yc - crook_t_y/2;
    crook_vert_y1 = crook_yc + crook_t_y/2;
    crook_vert_z0 = crook_top_z - crook_drop_z;
    crook_vert_z1 = crook_top_z;

    crook_horiz_x0 = crook_xc - crook_left_dx;
    crook_horiz_x1 = crook_xc;
    crook_horiz_y0 = crook_vert_y0;
    crook_horiz_y1 = crook_vert_y1;
    crook_horiz_z0 = crook_vert_z0;
    crook_horiz_z1 = crook_vert_z0 + crook_w_x;

    union() {
        rect_prism(crook_vert_x0, crook_vert_x1, crook_vert_y0, crook_vert_y1, crook_vert_z0, crook_vert_z1);
        rect_prism(crook_horiz_x0, crook_horiz_x1, crook_horiz_y0, crook_horiz_y1, crook_horiz_z0, crook_horiz_z1);
    }
}
module carriage_blinders() {
    // Roof-hung positive tooth. Its upper end overlaps the left roof so it is
    // not a side cantilever from the wall.
    rect_prism(latch_key_tooth_x0, latch_key_tooth_x1,
               latch_key_tooth_y0, latch_key_tooth_y1,
               latch_key_tooth_z0, latch_key_tooth_z1);

    // Three wall-rooted roof lips provide Z retention while leaving open space
    // for the tether. The right lip duplicates the middle one without adding
    // another vertical guide beside the pivot.
    garage_roof_lip(garage_left_roof_x0,
                    garage_left_roof_x1,
                    false);

    translate([0, 0, garage_middle_right_raise_z]) {
        garage_roof_lip((corral_inner_x0 + corral_inner_x1)/2
                            - garage_middle_roof_w_x/2,
                        (corral_inner_x0 + corral_inner_x1)/2
                            + garage_middle_roof_w_x/2,
                        false);

        garage_roof_lip(garage_right_roof_center_x
                            - garage_right_roof_w_x/2,
                        garage_right_roof_center_x
                            + garage_right_roof_w_x/2,
                        false);
    }
}

module paper_glide_ramp(x0, x1, free_y, root_y, base_z) {
    // A zero-height endpoint is represented by a very shallow embedded slice
    // so the hull remains manifold and merges cleanly into the base plate.
    hull() {
        rect_prism(x0, x1,
                   free_y, free_y + paper_ramp_slice_y,
                   base_z - eps, base_z);
        rect_prism(x0, x1,
                   root_y - paper_ramp_slice_y, root_y,
                   base_z - eps, base_z + paper_ramp_root_h_z);
    }
}

module garage_roof_lip(x0, x1, include_cup=true) {
    nose_slice_y = 0.05;

    // Flat wall-rooted portion.
    rect_prism(x0, x1,
               garage_roof_cup_y1, blinder_y1,
               garage_roof_underside_z, blinder_z1);

    paper_glide_ramp(x0, x1,
                     garage_roof_cup_y1, blinder_y1,
                     blinder_z1);

    if (include_cup) {
        // The left roof retains its shallow outer cup because it also carries
        // the keyed end structure. The middle and right ribs stop 4 mm sooner
        // over the weight's main body rather than following the round flange.
        hull() {
            rect_prism(x0, x1,
                       garage_roof_cup_y1 - nose_slice_y,
                       garage_roof_cup_y1,
                       garage_roof_underside_z, blinder_z1);

            rect_prism(x0, x1,
                       blinder_y0,
                       blinder_y0 + nose_slice_y,
                       garage_roof_underside_z - garage_roof_cup_drop_z,
                       blinder_z1 - garage_roof_cup_drop_z);
        }
    }
}
// =========================================================
// GEOMETRY
// =========================================================
rig_wall_extra_x = 3.0;
rig_wall_extra_z = 2.0;

// shifts only the wall profile upward so its ledge/bar Z can match wet rig
clock_wall_profile_dz = 5.0;
module wall_only() {
    if (show_wall)
        translate([0, 0, canonical_wall_z0])
            linear_extrude(height = wall_h)
                polygon(points = [
                    [canonical_wall_x0, 0],
                    [canonical_wall_x1 - rig_right_edge_lead_in, 0],
                    [canonical_wall_x1,
                     wall_t - rig_right_edge_nose_t],
                    [canonical_wall_x1, wall_t],
                    [canonical_wall_x0, wall_t]
                ]);
}

module bayonet_stop_lug() {
    translate([pivot_x, 0, pivot_z])
        rotate([0, -bayonet_lug_angle, 0])
            hull() {
                // Begin within the supported post radius.
                rect_prism(neck_d / 2 - bayonet_lug_root_overlap,
                           post_d / 2,
                           post_y1 - bayonet_lug_slice_y, post_y1,
                           -bayonet_lug_tangent_w / 2,
                           bayonet_lug_tangent_w / 2);

                // Grow gradually to a simple symmetric printable tip at the
                // neck end; the diagonal keyway supplies the asymmetry.
                rect_prism(neck_d / 2 - bayonet_lug_root_overlap,
                           bayonet_lug_outer_r,
                           neck_y1, neck_y1 + bayonet_lug_slice_y,
                           -bayonet_lug_tip_w / 2,
                           bayonet_lug_tip_w / 2);
            }
}

module latch_base_only() {
    union() {
        // Round wall-rooted pedestal: the complete rectangular pad is gone,
        // leaving a direct and rotation-friendly load path to the pivot stack.
        translate([pivot_x,0,pivot_z])
            cyl_y_span(pivot_boss_d, pad_y_wall, pad_y_out);

        translate([pivot_x,0,pivot_z]) {
            cyl_y_span(standoff_d, standoff_y0, standoff_y1);
            cyl_y_span(post_d,     post_y0,     post_y1);
            cyl_y_span(neck_d,     neck_y0,     neck_y1);
        }

        bayonet_stop_lug();
    }
}

module slotted_tunnel_only() {
    union() {
        difference() {
            union() {
                rect_prism(tunnel_x0, tunnel_x1, tunnel_y_front, tunnel_y_back, tunnel_z0, tunnel_z1);
                rect_prism(slot_x0, slot_x1,
                    slot_y0 - cubby_extra_y/2 - cubby_wall_y,
                    slot_y1 + cubby_extra_y/2 + cubby_wall_y,
                    tunnel_z0 - cubby_drop_z, tunnel_z0);
            }

            rect_prism(slot_x0, slot_x1, slot_y0, slot_y1, slot_z0, slot_z1);

            rect_prism(slot_x0, slot_x1,
                slot_y0 - cubby_extra_y/2,
                slot_y1 + cubby_extra_y/2,
                tunnel_z0 - cubby_drop_z + cubby_floor_z,
                tunnel_z0 - cubby_drop_z + cubby_floor_z + cubby_depth_z);
        }

        paper_glide_ramp(tunnel_x0, tunnel_x1,
                         tunnel_y_front, tunnel_y_back,
                         tunnel_z1);
    }
}

module tunnel_visor() {
    rect_prism(visor_x0, visor_x1, visor_y0, visor_y1, visor_z0, visor_z1);
}
visor_drop_corner_chop_x = 6.0;
visor_drop_corner_chop_z = 6.0;
module tunnel_visor_drop() {
    difference() {
        rect_prism(visor_drop_x0, visor_drop_x1,
                   visor_drop_y0, visor_drop_y1,
                   visor_drop_z0, visor_drop_z1);

        // remove bottom-outboard corner of vertical drop to avoid support
        rect_prism(
            visor_drop_x1 - visor_drop_corner_chop_x,
            visor_drop_x1 + eps,
            visor_drop_y0 - eps,
            visor_drop_y1 + eps,
            visor_drop_z0 - eps,
            visor_drop_z0 + visor_drop_corner_chop_z
        );
    }
}
module tunnel_inner_stop() {
    rect_prism(inner_stop_x0, inner_stop_x1, inner_stop_y0, inner_stop_y1, inner_stop_z0, inner_stop_z1);
}

module tunnel_system() {
    slotted_tunnel_only();
    // The former visor span, curtain, and inner stop restrained the old
    // uncontained weight/latch package. The pivot-constrained keyed corral
    // supersedes all three; leaving them out removes snagging surfaces from
    // the latch's swept path.
    tunnel_crook();
}

module fixed_rig() {
    union() {
        wall_only();
        latch_base_only();
        tunnel_system();
        carriage_blinders();
    }
}

assert(bayonet_lug_angle == 0,
       "wall-rig retention requires the fixed nub to face outward toward +X");

fixed_rig();
